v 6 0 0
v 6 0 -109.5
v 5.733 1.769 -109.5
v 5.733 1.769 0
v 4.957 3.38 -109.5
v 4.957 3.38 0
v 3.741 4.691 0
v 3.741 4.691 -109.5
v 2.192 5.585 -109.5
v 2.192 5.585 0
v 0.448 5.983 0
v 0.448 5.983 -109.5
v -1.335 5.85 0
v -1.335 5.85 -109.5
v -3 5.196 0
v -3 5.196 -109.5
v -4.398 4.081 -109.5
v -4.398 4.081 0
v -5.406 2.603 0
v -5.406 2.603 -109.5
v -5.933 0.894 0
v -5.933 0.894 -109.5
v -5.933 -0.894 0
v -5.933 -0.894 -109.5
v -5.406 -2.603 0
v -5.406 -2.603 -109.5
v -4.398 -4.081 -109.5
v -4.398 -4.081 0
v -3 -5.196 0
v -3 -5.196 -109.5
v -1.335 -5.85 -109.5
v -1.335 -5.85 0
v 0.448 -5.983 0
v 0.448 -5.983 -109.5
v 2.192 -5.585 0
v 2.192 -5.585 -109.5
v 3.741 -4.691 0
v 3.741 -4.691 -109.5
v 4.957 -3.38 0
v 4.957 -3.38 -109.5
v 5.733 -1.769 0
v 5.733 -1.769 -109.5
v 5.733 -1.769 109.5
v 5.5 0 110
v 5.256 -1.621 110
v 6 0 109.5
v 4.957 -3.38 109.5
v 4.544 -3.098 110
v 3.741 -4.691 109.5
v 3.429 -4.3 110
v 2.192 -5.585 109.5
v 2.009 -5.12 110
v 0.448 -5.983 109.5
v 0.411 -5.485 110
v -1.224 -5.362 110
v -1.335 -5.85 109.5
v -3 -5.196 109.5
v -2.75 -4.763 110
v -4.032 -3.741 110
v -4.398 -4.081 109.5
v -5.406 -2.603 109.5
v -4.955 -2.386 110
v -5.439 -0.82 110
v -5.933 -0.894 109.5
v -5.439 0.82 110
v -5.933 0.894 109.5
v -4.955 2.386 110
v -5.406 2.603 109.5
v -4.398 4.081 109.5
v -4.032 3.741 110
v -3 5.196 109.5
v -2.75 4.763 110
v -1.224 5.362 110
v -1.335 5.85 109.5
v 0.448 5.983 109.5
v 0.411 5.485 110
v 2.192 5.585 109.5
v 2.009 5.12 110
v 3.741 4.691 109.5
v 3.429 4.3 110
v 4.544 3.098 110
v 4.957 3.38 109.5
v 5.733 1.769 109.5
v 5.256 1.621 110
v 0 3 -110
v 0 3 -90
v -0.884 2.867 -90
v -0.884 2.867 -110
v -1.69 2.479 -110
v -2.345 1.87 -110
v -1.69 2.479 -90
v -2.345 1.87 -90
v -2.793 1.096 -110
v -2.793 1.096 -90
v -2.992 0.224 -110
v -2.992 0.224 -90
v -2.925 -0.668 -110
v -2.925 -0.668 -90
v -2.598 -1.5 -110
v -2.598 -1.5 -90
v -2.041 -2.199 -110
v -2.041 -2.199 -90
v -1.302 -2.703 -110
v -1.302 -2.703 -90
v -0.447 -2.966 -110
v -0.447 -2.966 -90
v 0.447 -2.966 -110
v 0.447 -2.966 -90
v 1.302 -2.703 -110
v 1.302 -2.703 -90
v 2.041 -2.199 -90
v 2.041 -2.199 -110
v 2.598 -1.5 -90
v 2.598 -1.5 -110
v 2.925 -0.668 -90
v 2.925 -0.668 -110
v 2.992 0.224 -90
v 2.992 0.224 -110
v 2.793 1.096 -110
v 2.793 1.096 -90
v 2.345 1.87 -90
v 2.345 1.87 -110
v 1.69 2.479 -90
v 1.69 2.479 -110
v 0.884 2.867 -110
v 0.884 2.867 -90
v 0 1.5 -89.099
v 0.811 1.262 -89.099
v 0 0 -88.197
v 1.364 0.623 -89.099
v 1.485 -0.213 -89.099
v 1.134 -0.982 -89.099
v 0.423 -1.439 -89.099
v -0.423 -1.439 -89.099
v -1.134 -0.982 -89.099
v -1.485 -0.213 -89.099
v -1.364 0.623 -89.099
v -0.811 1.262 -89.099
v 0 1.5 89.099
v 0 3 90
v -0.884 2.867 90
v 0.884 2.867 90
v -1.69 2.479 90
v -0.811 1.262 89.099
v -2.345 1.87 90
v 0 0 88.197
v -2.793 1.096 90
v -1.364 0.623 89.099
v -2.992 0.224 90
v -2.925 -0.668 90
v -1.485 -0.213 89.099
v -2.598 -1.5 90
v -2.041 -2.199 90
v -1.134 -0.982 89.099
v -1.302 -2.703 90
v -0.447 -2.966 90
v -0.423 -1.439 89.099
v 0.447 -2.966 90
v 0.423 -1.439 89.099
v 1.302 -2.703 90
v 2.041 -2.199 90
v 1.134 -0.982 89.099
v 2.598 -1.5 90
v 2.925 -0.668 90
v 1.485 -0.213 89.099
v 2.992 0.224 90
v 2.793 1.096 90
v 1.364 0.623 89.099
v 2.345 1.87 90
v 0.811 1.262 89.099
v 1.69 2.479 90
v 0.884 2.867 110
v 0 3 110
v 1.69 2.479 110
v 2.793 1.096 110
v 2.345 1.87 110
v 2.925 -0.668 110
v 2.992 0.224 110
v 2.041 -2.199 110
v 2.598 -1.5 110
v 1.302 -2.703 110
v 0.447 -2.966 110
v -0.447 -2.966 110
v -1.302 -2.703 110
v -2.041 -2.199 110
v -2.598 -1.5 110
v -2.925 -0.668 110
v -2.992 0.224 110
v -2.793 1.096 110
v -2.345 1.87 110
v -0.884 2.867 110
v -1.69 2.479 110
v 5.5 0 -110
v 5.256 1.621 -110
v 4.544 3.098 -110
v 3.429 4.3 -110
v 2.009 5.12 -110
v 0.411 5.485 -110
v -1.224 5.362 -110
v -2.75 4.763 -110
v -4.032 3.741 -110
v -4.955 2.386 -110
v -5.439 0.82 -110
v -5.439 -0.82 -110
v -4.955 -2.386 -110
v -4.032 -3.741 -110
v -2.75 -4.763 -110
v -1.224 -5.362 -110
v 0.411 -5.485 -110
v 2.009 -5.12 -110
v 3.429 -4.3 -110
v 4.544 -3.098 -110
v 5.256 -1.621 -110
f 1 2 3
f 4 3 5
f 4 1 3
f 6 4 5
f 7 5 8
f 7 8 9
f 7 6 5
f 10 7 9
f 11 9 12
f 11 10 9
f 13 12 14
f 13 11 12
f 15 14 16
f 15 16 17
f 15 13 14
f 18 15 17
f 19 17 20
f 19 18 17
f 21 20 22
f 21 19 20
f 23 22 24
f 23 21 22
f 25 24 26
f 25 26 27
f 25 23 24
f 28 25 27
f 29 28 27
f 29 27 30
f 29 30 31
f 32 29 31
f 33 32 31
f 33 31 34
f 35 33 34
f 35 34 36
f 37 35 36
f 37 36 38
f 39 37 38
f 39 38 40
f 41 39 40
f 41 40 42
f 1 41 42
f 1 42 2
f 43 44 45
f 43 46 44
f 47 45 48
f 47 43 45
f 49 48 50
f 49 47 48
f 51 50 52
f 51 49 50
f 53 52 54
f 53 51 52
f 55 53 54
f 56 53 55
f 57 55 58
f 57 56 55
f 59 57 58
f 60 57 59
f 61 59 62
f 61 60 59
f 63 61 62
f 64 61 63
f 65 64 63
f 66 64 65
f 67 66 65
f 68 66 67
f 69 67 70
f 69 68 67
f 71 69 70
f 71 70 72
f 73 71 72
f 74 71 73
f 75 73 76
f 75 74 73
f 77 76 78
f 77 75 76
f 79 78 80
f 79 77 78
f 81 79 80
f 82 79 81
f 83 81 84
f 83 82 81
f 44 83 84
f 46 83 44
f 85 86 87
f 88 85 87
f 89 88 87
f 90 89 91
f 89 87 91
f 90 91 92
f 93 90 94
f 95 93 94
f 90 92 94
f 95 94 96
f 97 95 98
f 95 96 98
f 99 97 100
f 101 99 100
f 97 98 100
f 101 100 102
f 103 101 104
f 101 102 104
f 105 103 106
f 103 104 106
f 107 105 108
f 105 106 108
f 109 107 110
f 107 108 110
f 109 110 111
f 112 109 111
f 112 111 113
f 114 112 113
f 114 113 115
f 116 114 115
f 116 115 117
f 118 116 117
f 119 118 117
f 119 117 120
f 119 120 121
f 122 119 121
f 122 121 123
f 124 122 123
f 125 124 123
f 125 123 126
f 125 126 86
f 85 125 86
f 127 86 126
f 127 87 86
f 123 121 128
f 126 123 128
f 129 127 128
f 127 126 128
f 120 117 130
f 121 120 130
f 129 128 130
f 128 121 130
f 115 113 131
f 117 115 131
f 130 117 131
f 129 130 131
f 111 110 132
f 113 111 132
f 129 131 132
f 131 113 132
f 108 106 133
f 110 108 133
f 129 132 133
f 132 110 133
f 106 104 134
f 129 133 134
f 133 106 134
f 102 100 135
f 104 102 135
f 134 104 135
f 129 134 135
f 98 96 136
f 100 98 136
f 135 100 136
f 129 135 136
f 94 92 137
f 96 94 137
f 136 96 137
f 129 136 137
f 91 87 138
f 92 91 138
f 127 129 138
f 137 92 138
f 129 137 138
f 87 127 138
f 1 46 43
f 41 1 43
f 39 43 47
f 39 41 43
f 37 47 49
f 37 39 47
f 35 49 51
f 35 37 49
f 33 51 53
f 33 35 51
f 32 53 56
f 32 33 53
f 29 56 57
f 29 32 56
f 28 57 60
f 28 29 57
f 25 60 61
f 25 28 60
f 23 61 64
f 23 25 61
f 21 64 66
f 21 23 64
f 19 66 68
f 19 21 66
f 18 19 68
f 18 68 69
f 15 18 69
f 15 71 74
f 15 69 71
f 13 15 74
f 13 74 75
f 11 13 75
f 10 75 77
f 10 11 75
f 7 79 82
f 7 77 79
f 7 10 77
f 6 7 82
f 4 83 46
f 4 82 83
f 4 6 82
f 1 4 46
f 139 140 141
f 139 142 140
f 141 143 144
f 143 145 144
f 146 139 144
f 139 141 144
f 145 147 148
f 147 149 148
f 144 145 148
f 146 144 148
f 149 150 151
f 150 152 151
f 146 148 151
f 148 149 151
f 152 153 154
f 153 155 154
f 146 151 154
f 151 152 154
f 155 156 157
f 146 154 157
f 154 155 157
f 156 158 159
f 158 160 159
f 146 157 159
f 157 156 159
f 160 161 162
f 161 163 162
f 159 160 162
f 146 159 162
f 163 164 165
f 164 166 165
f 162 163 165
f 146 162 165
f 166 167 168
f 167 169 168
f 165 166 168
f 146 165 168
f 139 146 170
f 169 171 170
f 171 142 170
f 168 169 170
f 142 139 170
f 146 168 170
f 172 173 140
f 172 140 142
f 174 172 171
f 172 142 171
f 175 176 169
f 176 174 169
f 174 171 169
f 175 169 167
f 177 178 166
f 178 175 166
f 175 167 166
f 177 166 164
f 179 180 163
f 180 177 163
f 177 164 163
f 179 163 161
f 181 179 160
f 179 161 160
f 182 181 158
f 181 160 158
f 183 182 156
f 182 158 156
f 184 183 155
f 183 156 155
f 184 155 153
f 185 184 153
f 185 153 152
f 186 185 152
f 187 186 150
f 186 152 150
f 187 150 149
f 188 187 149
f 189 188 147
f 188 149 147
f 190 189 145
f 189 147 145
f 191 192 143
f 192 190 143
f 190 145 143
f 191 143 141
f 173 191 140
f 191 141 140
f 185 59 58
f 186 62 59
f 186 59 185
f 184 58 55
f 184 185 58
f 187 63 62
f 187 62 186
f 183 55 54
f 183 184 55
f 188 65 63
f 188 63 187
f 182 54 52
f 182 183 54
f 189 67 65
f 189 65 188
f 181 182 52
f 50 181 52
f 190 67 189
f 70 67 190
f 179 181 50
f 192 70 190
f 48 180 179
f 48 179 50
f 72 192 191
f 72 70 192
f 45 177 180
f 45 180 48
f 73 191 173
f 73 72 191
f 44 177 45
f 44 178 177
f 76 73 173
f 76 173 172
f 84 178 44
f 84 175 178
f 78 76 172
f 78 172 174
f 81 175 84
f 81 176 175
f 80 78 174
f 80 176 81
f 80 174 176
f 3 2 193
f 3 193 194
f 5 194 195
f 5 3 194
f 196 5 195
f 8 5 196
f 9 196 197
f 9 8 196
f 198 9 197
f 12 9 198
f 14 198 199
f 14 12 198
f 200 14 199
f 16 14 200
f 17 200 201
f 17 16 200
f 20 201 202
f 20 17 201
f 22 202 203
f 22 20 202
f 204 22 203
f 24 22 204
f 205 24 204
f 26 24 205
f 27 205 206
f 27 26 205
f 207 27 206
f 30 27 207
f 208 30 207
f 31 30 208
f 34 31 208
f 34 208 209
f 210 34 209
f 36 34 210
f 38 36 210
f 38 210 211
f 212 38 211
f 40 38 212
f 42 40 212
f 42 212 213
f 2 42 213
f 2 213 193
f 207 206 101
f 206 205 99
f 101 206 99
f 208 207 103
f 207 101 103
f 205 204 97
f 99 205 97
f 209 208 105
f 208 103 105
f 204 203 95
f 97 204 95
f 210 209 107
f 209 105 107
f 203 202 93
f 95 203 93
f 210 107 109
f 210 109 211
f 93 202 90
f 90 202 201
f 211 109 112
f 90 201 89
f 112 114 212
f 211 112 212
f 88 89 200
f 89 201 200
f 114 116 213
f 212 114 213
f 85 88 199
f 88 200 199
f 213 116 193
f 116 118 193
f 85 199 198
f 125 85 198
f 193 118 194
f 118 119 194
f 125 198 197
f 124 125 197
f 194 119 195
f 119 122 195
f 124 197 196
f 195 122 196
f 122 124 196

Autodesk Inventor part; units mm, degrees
ref_plane "YZ Plane" through (0, 0, 0) normal (1, 0, 0) x (0, 1, 0)
ref_plane "XZ Plane" through (0, 0, 0) normal (0, 1, 0) x (-1, 0, 0)
ref_plane "XY Plane" through (0, 0, 0) normal (0, 0, 1) x (1, 0, 0)
sketch "Sketch1" plane through (0, 0, 0) normal (0, 0, 1) x (1, 0, 0)
  circle A0 centre (0, 0) radius 6
  dimension "d0" = 12
extrude "Extrusion1" add sketch "Sketch1" along normal mid plane 220
sketch "Sketch2" plane through (0, 0, -110) normal (0, 0, -1) x (-1, 0, 0)
  point P0 (0, 0)
  point P1 (0, 0)
hole "Hole1" at (0, 0, -110) direction (0, 0, 1) diameter 6 depth 20 tip angle 118
thread "Thread1" size "M6x1" class "6H" standard "ANSI Metric M Profile" full length
mirror "Mirror1" about plane through (0, 0, 0) normal (0, 0, 1) of "Hole1"
chamfer "Chamfer2" distance 0.5 angle 45 2 edges at (-6, 0, -110) (-6, 0, 110)
properties part number "Rod-12x220-M6" material "Stainless Steel"
